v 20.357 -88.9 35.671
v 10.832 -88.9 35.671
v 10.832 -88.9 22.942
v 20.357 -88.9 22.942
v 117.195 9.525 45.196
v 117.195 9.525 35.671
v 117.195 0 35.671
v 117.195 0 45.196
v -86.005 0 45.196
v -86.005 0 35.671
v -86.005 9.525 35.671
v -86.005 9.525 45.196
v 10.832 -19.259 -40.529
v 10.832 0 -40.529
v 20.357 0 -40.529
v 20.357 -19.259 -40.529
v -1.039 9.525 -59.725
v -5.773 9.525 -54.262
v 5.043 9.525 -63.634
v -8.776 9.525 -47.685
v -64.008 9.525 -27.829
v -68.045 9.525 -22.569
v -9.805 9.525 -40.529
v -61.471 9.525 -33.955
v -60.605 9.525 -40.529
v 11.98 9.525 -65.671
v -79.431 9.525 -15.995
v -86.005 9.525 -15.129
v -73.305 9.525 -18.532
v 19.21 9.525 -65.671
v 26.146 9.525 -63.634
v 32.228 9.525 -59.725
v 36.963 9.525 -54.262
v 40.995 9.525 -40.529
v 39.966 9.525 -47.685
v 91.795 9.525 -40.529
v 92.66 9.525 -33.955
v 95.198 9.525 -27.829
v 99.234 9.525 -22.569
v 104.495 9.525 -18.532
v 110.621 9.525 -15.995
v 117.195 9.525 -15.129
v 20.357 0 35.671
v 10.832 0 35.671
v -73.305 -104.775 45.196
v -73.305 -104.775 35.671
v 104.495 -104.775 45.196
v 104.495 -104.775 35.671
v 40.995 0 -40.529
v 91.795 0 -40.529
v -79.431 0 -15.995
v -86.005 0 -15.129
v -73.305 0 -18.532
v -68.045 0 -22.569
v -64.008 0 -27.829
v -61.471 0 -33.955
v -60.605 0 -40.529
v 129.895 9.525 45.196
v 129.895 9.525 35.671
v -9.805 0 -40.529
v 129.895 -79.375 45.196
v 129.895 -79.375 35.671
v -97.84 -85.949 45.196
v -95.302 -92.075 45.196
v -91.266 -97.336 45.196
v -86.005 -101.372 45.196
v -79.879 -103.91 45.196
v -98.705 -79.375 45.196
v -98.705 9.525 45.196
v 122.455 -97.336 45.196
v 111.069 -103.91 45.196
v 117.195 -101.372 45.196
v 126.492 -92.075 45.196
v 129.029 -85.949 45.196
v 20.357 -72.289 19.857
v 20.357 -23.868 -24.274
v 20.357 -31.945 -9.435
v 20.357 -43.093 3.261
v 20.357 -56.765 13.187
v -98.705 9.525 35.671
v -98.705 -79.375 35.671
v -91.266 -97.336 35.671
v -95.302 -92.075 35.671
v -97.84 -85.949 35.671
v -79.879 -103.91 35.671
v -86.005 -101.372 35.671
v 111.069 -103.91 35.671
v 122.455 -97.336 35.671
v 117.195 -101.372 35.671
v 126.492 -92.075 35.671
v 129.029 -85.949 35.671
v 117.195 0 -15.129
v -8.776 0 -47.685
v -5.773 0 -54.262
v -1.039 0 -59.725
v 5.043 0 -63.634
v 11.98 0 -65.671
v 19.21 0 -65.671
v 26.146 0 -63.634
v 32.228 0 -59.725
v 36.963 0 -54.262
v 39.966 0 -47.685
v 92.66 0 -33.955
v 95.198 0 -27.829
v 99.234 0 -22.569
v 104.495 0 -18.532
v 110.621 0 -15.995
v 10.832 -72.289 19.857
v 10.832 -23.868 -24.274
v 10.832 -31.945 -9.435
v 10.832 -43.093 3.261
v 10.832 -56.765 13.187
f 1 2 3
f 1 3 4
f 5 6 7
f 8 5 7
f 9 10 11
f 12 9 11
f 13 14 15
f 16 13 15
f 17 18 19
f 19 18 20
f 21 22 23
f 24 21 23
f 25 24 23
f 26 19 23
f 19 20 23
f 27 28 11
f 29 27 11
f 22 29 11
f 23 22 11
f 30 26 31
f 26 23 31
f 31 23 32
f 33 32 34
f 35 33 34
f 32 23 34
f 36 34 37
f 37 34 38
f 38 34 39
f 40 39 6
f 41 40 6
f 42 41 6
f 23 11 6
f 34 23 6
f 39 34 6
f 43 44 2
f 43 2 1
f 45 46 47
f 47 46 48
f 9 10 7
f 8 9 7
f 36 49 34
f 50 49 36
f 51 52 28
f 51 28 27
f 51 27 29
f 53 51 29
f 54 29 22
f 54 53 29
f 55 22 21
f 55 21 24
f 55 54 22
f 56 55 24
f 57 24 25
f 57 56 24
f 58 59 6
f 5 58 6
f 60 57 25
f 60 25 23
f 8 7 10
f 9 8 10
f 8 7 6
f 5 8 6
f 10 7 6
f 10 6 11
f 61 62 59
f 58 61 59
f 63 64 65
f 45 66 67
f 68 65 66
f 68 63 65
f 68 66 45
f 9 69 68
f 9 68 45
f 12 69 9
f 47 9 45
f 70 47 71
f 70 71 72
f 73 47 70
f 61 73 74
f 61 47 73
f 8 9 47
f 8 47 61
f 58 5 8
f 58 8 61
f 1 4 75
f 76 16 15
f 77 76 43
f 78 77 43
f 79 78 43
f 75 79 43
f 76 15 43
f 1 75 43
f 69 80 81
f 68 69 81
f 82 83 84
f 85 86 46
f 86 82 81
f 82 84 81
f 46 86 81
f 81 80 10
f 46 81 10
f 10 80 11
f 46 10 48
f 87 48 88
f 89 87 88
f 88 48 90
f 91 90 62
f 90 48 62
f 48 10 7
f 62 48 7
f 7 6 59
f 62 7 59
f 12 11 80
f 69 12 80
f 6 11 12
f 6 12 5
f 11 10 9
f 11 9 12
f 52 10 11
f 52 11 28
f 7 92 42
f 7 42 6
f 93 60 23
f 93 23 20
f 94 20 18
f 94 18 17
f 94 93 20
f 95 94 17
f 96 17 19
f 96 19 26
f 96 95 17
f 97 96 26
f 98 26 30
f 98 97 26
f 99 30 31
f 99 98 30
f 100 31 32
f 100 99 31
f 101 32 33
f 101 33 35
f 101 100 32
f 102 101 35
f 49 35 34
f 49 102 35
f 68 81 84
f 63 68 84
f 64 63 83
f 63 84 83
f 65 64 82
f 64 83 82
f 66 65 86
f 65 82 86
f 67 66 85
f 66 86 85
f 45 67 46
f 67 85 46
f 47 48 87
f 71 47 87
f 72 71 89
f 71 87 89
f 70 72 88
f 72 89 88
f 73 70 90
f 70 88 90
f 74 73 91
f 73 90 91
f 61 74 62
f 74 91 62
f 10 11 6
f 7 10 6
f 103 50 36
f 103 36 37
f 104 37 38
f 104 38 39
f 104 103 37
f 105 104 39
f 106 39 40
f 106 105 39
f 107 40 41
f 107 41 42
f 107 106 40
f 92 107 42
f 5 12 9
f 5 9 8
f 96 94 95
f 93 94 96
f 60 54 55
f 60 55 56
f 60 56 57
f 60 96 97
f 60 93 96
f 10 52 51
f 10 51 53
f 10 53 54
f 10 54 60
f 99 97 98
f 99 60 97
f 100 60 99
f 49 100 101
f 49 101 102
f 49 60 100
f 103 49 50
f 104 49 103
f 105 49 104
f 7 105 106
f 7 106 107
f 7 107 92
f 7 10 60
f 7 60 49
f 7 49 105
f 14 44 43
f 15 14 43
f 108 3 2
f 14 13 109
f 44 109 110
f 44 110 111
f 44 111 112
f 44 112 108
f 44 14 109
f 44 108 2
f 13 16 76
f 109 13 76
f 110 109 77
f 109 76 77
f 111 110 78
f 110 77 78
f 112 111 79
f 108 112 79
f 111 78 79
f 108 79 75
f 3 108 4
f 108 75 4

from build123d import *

# Parameters (mm, degrees)
F1_DEPTH = 9.525
F3_DEPTH = 9.525
F4_W     = 203.2
F4_H     = 9.525
F5_DEPTH = 9.525
F6_W     = 9.525
F6_H     = 76.2
F7_DEPTH = 88.9
F9_DEPTH = 19.304


with BuildPart() as f1:
    # F0 (on Front) → F1 (new body)
    with BuildSketch(Plane.XZ):
        with BuildLine():
            Line((117.194766, 35.670682), (-86.005234, 35.670682))
            Line((-86.005234, 35.670682), (-86.005234, -15.129318))
            ThreePointArc((-86.005234, -15.129318), (-68.044722, -22.568806), (-60.605234, -40.529318))
            Line((-60.605234, -40.529318), (-9.805234, -40.529318))
            ThreePointArc((-9.805234, -40.529318), (15.594766, -65.929318), (40.994766, -40.529318))
            Line((40.994766, -40.529318), (91.794766, -40.529318))
            ThreePointArc((91.794766, -40.529318), (99.234253, -22.568806), (117.194766, -15.129318))
            Line((117.194766, -15.129318), (117.194766, 35.670682))
        make_face()
    extrude(amount=-F1_DEPTH)


with BuildPart() as f3:
    # F2 (on face) → F3 (new body)
    with BuildSketch(Plane.XY.offset(35.670682)):
        with BuildLine():
            Line((-86.005234, 9.525), (-98.705234, 9.525))
            Line((-98.705234, 9.525), (-98.705234, -79.375))
            ThreePointArc((-98.705234, -79.375), (-91.265747, -97.335512), (-73.305234, -104.775))
            Line((-73.305234, -104.775), (104.494766, -104.775))
            ThreePointArc((104.494766, -104.775), (122.455278, -97.335512), (129.894766, -79.375))
            Line((129.894766, -79.375), (129.894766, 9.525))
            Line((129.894766, 9.525), (117.194766, 9.525))
            Line((117.194766, 9.525), (117.194766, 0))
            Line((117.194766, 0), (-86.005234, 0))
            Line((-86.005234, 0), (-86.005234, 9.525))
        make_face()
    extrude(amount=F3_DEPTH)


with BuildPart() as f5:
    # F4 (on face) → F5 (new body)
    with BuildSketch(Plane.XY.offset(35.670682)):
        with Locations((15.594766, 4.7625)):
            Rectangle(F4_W, F4_H)
    extrude(amount=F5_DEPTH)


with BuildPart() as f7:
    # F6 (on face) → F7 (new body)
    with BuildSketch(Plane.XZ):
        with Locations((15.594766, -2.429318)):
            Rectangle(F6_W, F6_H)
    extrude(amount=F7_DEPTH)

    # F8 (on face) → F9 (cut)
    with BuildSketch(Plane.YZ.offset(20.357266)):
        with BuildLine():
            Line((-88.9, -40.529318), (-19.259443, -40.529318))
            ThreePointArc((-19.259443, -40.529318), (-43.093247, 3.26067), (-88.9, 22.941996))
            Line((-88.9, 22.941996), (-88.9, -40.529318))
        make_face()
        with BuildLine():
            ThreePointArc((-88.9, 22.941996), (-150.222354, -104.949952), (-18.222476, -53.057624))
            ThreePointArc((-18.222476, -53.057624), (-18.482161, -46.77205), (-19.259443, -40.529318))
            Line((-19.259443, -40.529318), (-88.9, -40.529318))
            Line((-88.9, -40.529318), (-88.9, 22.941996))
        make_face()
    extrude(amount=-F9_DEPTH, mode=Mode.SUBTRACT)


solid = Compound([f1.part, f3.part, f5.part, f7.part])
